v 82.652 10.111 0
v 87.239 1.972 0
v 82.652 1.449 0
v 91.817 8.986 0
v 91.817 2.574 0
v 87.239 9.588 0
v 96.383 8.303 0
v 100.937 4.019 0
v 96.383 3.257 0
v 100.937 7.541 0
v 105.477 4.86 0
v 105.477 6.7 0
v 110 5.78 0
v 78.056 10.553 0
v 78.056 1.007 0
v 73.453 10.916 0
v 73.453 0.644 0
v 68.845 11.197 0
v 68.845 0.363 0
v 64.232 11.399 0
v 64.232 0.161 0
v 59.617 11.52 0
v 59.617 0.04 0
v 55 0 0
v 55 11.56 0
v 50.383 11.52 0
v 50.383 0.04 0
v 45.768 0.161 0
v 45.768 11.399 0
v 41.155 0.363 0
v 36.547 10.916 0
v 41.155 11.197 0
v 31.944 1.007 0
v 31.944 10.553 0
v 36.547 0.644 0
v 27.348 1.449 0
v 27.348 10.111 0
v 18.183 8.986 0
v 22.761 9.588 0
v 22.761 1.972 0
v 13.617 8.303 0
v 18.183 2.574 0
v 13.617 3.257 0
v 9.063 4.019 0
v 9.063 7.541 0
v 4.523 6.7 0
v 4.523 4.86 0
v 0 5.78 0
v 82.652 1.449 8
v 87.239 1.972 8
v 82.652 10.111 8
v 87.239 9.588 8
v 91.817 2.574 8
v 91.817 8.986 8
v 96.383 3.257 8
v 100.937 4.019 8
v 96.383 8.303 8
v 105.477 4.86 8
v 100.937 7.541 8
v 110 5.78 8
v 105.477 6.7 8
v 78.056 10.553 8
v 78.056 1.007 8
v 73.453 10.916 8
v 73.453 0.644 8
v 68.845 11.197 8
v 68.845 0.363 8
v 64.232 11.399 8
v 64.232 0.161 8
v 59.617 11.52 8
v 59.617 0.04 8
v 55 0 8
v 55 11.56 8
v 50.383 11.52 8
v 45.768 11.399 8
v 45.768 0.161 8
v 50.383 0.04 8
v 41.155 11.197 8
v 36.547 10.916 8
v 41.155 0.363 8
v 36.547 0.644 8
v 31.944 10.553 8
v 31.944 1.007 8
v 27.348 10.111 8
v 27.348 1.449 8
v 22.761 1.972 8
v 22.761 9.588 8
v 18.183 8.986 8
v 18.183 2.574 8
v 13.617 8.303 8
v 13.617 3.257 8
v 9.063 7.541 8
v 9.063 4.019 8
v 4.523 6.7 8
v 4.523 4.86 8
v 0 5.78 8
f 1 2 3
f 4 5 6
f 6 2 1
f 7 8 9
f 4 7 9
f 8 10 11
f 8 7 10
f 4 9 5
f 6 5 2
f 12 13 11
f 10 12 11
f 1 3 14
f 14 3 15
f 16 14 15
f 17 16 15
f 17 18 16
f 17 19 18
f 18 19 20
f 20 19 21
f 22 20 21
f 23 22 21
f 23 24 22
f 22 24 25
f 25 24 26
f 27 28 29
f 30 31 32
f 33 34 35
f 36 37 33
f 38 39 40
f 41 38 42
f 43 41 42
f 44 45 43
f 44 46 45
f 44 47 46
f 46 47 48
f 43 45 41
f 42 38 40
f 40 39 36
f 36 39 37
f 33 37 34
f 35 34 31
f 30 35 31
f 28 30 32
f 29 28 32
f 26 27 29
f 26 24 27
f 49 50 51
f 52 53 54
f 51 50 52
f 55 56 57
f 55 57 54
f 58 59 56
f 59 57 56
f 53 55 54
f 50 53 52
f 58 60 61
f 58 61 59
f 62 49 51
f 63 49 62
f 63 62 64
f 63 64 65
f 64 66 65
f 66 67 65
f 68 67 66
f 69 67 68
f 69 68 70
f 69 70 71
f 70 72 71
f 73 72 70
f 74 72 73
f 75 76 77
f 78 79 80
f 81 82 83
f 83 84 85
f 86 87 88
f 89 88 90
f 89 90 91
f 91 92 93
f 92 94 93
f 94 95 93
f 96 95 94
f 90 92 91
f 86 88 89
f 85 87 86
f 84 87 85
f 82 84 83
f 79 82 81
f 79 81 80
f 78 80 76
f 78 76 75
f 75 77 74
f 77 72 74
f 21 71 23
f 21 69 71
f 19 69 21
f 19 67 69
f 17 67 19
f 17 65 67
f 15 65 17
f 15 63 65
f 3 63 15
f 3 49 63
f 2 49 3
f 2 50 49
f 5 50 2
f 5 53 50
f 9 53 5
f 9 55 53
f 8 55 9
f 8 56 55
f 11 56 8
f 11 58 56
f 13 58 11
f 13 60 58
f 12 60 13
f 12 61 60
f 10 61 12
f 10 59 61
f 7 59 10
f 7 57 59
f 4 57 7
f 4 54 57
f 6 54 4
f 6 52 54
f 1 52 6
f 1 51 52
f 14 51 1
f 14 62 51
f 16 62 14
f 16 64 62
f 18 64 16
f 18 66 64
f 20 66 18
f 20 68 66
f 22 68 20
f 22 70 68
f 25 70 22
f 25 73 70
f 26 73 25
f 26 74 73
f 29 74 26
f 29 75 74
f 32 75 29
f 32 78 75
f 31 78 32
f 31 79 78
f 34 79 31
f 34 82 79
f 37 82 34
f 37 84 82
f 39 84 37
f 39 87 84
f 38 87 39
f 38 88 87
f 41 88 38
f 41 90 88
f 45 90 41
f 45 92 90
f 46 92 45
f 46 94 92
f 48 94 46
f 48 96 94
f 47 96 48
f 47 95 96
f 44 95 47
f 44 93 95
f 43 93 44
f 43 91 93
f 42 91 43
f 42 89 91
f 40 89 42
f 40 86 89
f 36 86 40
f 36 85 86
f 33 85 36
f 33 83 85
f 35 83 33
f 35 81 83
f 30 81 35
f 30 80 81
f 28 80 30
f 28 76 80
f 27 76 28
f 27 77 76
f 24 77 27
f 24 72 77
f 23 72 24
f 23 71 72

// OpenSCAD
$fn = 32;

// ----------------------------------------------------------------------
// Arc profile plate: lens, 48 points
// ----------------------------------------------------------------------

// --- parameters (mm) ---
lens_chord = 110;         // chord length of the lens, X
arc_r = 264.54;           // radius of both arcs
arc_angle = 24;           // angle of each arc, degrees
sagitta = 5.78;           // bulge of each arc (half the lens height)
arc_step = 1;             // sampling step of the arcs, degrees
plate_t = 8;              // plate thickness, Z
fit_tol = 0.1;            // declared fit tolerance (prompt contract)
free_tol = 0.3;           // declared free tolerance (prompt contract)

bbox_y = 2 * sagitta;  // full lens height

profile = [[110, 5.78], [105.477, 6.7], [100.937, 7.541], [96.383, 8.303], [91.817, 8.986], [87.239, 9.588], [82.652, 10.111], [78.056, 10.553], [73.453, 10.916], [68.845, 11.197], [64.232, 11.399], [59.617, 11.52], [55, 11.56], [50.383, 11.52], [45.768, 11.399], [41.155, 11.197], [36.547, 10.916], [31.944, 10.553], [27.348, 10.111], [22.761, 9.588], [18.183, 8.986], [13.617, 8.303], [9.063, 7.541], [4.523, 6.7], [0, 5.78], [4.523, 4.86], [9.063, 4.019], [13.617, 3.257], [18.183, 2.574], [22.761, 1.972], [27.348, 1.449], [31.944, 1.007], [36.547, 0.644], [41.155, 0.363], [45.768, 0.161], [50.383, 0.04], [55, 0], [59.617, 0.04], [64.232, 0.161], [68.845, 0.363], [73.453, 0.644], [78.056, 1.007], [82.652, 1.449], [87.239, 1.972], [91.817, 2.574], [96.383, 3.257], [100.937, 4.019], [105.477, 4.86]];  // primary outline, 48 points, counter clockwise

// --- the one profile operation ---
linear_extrude(height = plate_t) polygon(points = profile);
